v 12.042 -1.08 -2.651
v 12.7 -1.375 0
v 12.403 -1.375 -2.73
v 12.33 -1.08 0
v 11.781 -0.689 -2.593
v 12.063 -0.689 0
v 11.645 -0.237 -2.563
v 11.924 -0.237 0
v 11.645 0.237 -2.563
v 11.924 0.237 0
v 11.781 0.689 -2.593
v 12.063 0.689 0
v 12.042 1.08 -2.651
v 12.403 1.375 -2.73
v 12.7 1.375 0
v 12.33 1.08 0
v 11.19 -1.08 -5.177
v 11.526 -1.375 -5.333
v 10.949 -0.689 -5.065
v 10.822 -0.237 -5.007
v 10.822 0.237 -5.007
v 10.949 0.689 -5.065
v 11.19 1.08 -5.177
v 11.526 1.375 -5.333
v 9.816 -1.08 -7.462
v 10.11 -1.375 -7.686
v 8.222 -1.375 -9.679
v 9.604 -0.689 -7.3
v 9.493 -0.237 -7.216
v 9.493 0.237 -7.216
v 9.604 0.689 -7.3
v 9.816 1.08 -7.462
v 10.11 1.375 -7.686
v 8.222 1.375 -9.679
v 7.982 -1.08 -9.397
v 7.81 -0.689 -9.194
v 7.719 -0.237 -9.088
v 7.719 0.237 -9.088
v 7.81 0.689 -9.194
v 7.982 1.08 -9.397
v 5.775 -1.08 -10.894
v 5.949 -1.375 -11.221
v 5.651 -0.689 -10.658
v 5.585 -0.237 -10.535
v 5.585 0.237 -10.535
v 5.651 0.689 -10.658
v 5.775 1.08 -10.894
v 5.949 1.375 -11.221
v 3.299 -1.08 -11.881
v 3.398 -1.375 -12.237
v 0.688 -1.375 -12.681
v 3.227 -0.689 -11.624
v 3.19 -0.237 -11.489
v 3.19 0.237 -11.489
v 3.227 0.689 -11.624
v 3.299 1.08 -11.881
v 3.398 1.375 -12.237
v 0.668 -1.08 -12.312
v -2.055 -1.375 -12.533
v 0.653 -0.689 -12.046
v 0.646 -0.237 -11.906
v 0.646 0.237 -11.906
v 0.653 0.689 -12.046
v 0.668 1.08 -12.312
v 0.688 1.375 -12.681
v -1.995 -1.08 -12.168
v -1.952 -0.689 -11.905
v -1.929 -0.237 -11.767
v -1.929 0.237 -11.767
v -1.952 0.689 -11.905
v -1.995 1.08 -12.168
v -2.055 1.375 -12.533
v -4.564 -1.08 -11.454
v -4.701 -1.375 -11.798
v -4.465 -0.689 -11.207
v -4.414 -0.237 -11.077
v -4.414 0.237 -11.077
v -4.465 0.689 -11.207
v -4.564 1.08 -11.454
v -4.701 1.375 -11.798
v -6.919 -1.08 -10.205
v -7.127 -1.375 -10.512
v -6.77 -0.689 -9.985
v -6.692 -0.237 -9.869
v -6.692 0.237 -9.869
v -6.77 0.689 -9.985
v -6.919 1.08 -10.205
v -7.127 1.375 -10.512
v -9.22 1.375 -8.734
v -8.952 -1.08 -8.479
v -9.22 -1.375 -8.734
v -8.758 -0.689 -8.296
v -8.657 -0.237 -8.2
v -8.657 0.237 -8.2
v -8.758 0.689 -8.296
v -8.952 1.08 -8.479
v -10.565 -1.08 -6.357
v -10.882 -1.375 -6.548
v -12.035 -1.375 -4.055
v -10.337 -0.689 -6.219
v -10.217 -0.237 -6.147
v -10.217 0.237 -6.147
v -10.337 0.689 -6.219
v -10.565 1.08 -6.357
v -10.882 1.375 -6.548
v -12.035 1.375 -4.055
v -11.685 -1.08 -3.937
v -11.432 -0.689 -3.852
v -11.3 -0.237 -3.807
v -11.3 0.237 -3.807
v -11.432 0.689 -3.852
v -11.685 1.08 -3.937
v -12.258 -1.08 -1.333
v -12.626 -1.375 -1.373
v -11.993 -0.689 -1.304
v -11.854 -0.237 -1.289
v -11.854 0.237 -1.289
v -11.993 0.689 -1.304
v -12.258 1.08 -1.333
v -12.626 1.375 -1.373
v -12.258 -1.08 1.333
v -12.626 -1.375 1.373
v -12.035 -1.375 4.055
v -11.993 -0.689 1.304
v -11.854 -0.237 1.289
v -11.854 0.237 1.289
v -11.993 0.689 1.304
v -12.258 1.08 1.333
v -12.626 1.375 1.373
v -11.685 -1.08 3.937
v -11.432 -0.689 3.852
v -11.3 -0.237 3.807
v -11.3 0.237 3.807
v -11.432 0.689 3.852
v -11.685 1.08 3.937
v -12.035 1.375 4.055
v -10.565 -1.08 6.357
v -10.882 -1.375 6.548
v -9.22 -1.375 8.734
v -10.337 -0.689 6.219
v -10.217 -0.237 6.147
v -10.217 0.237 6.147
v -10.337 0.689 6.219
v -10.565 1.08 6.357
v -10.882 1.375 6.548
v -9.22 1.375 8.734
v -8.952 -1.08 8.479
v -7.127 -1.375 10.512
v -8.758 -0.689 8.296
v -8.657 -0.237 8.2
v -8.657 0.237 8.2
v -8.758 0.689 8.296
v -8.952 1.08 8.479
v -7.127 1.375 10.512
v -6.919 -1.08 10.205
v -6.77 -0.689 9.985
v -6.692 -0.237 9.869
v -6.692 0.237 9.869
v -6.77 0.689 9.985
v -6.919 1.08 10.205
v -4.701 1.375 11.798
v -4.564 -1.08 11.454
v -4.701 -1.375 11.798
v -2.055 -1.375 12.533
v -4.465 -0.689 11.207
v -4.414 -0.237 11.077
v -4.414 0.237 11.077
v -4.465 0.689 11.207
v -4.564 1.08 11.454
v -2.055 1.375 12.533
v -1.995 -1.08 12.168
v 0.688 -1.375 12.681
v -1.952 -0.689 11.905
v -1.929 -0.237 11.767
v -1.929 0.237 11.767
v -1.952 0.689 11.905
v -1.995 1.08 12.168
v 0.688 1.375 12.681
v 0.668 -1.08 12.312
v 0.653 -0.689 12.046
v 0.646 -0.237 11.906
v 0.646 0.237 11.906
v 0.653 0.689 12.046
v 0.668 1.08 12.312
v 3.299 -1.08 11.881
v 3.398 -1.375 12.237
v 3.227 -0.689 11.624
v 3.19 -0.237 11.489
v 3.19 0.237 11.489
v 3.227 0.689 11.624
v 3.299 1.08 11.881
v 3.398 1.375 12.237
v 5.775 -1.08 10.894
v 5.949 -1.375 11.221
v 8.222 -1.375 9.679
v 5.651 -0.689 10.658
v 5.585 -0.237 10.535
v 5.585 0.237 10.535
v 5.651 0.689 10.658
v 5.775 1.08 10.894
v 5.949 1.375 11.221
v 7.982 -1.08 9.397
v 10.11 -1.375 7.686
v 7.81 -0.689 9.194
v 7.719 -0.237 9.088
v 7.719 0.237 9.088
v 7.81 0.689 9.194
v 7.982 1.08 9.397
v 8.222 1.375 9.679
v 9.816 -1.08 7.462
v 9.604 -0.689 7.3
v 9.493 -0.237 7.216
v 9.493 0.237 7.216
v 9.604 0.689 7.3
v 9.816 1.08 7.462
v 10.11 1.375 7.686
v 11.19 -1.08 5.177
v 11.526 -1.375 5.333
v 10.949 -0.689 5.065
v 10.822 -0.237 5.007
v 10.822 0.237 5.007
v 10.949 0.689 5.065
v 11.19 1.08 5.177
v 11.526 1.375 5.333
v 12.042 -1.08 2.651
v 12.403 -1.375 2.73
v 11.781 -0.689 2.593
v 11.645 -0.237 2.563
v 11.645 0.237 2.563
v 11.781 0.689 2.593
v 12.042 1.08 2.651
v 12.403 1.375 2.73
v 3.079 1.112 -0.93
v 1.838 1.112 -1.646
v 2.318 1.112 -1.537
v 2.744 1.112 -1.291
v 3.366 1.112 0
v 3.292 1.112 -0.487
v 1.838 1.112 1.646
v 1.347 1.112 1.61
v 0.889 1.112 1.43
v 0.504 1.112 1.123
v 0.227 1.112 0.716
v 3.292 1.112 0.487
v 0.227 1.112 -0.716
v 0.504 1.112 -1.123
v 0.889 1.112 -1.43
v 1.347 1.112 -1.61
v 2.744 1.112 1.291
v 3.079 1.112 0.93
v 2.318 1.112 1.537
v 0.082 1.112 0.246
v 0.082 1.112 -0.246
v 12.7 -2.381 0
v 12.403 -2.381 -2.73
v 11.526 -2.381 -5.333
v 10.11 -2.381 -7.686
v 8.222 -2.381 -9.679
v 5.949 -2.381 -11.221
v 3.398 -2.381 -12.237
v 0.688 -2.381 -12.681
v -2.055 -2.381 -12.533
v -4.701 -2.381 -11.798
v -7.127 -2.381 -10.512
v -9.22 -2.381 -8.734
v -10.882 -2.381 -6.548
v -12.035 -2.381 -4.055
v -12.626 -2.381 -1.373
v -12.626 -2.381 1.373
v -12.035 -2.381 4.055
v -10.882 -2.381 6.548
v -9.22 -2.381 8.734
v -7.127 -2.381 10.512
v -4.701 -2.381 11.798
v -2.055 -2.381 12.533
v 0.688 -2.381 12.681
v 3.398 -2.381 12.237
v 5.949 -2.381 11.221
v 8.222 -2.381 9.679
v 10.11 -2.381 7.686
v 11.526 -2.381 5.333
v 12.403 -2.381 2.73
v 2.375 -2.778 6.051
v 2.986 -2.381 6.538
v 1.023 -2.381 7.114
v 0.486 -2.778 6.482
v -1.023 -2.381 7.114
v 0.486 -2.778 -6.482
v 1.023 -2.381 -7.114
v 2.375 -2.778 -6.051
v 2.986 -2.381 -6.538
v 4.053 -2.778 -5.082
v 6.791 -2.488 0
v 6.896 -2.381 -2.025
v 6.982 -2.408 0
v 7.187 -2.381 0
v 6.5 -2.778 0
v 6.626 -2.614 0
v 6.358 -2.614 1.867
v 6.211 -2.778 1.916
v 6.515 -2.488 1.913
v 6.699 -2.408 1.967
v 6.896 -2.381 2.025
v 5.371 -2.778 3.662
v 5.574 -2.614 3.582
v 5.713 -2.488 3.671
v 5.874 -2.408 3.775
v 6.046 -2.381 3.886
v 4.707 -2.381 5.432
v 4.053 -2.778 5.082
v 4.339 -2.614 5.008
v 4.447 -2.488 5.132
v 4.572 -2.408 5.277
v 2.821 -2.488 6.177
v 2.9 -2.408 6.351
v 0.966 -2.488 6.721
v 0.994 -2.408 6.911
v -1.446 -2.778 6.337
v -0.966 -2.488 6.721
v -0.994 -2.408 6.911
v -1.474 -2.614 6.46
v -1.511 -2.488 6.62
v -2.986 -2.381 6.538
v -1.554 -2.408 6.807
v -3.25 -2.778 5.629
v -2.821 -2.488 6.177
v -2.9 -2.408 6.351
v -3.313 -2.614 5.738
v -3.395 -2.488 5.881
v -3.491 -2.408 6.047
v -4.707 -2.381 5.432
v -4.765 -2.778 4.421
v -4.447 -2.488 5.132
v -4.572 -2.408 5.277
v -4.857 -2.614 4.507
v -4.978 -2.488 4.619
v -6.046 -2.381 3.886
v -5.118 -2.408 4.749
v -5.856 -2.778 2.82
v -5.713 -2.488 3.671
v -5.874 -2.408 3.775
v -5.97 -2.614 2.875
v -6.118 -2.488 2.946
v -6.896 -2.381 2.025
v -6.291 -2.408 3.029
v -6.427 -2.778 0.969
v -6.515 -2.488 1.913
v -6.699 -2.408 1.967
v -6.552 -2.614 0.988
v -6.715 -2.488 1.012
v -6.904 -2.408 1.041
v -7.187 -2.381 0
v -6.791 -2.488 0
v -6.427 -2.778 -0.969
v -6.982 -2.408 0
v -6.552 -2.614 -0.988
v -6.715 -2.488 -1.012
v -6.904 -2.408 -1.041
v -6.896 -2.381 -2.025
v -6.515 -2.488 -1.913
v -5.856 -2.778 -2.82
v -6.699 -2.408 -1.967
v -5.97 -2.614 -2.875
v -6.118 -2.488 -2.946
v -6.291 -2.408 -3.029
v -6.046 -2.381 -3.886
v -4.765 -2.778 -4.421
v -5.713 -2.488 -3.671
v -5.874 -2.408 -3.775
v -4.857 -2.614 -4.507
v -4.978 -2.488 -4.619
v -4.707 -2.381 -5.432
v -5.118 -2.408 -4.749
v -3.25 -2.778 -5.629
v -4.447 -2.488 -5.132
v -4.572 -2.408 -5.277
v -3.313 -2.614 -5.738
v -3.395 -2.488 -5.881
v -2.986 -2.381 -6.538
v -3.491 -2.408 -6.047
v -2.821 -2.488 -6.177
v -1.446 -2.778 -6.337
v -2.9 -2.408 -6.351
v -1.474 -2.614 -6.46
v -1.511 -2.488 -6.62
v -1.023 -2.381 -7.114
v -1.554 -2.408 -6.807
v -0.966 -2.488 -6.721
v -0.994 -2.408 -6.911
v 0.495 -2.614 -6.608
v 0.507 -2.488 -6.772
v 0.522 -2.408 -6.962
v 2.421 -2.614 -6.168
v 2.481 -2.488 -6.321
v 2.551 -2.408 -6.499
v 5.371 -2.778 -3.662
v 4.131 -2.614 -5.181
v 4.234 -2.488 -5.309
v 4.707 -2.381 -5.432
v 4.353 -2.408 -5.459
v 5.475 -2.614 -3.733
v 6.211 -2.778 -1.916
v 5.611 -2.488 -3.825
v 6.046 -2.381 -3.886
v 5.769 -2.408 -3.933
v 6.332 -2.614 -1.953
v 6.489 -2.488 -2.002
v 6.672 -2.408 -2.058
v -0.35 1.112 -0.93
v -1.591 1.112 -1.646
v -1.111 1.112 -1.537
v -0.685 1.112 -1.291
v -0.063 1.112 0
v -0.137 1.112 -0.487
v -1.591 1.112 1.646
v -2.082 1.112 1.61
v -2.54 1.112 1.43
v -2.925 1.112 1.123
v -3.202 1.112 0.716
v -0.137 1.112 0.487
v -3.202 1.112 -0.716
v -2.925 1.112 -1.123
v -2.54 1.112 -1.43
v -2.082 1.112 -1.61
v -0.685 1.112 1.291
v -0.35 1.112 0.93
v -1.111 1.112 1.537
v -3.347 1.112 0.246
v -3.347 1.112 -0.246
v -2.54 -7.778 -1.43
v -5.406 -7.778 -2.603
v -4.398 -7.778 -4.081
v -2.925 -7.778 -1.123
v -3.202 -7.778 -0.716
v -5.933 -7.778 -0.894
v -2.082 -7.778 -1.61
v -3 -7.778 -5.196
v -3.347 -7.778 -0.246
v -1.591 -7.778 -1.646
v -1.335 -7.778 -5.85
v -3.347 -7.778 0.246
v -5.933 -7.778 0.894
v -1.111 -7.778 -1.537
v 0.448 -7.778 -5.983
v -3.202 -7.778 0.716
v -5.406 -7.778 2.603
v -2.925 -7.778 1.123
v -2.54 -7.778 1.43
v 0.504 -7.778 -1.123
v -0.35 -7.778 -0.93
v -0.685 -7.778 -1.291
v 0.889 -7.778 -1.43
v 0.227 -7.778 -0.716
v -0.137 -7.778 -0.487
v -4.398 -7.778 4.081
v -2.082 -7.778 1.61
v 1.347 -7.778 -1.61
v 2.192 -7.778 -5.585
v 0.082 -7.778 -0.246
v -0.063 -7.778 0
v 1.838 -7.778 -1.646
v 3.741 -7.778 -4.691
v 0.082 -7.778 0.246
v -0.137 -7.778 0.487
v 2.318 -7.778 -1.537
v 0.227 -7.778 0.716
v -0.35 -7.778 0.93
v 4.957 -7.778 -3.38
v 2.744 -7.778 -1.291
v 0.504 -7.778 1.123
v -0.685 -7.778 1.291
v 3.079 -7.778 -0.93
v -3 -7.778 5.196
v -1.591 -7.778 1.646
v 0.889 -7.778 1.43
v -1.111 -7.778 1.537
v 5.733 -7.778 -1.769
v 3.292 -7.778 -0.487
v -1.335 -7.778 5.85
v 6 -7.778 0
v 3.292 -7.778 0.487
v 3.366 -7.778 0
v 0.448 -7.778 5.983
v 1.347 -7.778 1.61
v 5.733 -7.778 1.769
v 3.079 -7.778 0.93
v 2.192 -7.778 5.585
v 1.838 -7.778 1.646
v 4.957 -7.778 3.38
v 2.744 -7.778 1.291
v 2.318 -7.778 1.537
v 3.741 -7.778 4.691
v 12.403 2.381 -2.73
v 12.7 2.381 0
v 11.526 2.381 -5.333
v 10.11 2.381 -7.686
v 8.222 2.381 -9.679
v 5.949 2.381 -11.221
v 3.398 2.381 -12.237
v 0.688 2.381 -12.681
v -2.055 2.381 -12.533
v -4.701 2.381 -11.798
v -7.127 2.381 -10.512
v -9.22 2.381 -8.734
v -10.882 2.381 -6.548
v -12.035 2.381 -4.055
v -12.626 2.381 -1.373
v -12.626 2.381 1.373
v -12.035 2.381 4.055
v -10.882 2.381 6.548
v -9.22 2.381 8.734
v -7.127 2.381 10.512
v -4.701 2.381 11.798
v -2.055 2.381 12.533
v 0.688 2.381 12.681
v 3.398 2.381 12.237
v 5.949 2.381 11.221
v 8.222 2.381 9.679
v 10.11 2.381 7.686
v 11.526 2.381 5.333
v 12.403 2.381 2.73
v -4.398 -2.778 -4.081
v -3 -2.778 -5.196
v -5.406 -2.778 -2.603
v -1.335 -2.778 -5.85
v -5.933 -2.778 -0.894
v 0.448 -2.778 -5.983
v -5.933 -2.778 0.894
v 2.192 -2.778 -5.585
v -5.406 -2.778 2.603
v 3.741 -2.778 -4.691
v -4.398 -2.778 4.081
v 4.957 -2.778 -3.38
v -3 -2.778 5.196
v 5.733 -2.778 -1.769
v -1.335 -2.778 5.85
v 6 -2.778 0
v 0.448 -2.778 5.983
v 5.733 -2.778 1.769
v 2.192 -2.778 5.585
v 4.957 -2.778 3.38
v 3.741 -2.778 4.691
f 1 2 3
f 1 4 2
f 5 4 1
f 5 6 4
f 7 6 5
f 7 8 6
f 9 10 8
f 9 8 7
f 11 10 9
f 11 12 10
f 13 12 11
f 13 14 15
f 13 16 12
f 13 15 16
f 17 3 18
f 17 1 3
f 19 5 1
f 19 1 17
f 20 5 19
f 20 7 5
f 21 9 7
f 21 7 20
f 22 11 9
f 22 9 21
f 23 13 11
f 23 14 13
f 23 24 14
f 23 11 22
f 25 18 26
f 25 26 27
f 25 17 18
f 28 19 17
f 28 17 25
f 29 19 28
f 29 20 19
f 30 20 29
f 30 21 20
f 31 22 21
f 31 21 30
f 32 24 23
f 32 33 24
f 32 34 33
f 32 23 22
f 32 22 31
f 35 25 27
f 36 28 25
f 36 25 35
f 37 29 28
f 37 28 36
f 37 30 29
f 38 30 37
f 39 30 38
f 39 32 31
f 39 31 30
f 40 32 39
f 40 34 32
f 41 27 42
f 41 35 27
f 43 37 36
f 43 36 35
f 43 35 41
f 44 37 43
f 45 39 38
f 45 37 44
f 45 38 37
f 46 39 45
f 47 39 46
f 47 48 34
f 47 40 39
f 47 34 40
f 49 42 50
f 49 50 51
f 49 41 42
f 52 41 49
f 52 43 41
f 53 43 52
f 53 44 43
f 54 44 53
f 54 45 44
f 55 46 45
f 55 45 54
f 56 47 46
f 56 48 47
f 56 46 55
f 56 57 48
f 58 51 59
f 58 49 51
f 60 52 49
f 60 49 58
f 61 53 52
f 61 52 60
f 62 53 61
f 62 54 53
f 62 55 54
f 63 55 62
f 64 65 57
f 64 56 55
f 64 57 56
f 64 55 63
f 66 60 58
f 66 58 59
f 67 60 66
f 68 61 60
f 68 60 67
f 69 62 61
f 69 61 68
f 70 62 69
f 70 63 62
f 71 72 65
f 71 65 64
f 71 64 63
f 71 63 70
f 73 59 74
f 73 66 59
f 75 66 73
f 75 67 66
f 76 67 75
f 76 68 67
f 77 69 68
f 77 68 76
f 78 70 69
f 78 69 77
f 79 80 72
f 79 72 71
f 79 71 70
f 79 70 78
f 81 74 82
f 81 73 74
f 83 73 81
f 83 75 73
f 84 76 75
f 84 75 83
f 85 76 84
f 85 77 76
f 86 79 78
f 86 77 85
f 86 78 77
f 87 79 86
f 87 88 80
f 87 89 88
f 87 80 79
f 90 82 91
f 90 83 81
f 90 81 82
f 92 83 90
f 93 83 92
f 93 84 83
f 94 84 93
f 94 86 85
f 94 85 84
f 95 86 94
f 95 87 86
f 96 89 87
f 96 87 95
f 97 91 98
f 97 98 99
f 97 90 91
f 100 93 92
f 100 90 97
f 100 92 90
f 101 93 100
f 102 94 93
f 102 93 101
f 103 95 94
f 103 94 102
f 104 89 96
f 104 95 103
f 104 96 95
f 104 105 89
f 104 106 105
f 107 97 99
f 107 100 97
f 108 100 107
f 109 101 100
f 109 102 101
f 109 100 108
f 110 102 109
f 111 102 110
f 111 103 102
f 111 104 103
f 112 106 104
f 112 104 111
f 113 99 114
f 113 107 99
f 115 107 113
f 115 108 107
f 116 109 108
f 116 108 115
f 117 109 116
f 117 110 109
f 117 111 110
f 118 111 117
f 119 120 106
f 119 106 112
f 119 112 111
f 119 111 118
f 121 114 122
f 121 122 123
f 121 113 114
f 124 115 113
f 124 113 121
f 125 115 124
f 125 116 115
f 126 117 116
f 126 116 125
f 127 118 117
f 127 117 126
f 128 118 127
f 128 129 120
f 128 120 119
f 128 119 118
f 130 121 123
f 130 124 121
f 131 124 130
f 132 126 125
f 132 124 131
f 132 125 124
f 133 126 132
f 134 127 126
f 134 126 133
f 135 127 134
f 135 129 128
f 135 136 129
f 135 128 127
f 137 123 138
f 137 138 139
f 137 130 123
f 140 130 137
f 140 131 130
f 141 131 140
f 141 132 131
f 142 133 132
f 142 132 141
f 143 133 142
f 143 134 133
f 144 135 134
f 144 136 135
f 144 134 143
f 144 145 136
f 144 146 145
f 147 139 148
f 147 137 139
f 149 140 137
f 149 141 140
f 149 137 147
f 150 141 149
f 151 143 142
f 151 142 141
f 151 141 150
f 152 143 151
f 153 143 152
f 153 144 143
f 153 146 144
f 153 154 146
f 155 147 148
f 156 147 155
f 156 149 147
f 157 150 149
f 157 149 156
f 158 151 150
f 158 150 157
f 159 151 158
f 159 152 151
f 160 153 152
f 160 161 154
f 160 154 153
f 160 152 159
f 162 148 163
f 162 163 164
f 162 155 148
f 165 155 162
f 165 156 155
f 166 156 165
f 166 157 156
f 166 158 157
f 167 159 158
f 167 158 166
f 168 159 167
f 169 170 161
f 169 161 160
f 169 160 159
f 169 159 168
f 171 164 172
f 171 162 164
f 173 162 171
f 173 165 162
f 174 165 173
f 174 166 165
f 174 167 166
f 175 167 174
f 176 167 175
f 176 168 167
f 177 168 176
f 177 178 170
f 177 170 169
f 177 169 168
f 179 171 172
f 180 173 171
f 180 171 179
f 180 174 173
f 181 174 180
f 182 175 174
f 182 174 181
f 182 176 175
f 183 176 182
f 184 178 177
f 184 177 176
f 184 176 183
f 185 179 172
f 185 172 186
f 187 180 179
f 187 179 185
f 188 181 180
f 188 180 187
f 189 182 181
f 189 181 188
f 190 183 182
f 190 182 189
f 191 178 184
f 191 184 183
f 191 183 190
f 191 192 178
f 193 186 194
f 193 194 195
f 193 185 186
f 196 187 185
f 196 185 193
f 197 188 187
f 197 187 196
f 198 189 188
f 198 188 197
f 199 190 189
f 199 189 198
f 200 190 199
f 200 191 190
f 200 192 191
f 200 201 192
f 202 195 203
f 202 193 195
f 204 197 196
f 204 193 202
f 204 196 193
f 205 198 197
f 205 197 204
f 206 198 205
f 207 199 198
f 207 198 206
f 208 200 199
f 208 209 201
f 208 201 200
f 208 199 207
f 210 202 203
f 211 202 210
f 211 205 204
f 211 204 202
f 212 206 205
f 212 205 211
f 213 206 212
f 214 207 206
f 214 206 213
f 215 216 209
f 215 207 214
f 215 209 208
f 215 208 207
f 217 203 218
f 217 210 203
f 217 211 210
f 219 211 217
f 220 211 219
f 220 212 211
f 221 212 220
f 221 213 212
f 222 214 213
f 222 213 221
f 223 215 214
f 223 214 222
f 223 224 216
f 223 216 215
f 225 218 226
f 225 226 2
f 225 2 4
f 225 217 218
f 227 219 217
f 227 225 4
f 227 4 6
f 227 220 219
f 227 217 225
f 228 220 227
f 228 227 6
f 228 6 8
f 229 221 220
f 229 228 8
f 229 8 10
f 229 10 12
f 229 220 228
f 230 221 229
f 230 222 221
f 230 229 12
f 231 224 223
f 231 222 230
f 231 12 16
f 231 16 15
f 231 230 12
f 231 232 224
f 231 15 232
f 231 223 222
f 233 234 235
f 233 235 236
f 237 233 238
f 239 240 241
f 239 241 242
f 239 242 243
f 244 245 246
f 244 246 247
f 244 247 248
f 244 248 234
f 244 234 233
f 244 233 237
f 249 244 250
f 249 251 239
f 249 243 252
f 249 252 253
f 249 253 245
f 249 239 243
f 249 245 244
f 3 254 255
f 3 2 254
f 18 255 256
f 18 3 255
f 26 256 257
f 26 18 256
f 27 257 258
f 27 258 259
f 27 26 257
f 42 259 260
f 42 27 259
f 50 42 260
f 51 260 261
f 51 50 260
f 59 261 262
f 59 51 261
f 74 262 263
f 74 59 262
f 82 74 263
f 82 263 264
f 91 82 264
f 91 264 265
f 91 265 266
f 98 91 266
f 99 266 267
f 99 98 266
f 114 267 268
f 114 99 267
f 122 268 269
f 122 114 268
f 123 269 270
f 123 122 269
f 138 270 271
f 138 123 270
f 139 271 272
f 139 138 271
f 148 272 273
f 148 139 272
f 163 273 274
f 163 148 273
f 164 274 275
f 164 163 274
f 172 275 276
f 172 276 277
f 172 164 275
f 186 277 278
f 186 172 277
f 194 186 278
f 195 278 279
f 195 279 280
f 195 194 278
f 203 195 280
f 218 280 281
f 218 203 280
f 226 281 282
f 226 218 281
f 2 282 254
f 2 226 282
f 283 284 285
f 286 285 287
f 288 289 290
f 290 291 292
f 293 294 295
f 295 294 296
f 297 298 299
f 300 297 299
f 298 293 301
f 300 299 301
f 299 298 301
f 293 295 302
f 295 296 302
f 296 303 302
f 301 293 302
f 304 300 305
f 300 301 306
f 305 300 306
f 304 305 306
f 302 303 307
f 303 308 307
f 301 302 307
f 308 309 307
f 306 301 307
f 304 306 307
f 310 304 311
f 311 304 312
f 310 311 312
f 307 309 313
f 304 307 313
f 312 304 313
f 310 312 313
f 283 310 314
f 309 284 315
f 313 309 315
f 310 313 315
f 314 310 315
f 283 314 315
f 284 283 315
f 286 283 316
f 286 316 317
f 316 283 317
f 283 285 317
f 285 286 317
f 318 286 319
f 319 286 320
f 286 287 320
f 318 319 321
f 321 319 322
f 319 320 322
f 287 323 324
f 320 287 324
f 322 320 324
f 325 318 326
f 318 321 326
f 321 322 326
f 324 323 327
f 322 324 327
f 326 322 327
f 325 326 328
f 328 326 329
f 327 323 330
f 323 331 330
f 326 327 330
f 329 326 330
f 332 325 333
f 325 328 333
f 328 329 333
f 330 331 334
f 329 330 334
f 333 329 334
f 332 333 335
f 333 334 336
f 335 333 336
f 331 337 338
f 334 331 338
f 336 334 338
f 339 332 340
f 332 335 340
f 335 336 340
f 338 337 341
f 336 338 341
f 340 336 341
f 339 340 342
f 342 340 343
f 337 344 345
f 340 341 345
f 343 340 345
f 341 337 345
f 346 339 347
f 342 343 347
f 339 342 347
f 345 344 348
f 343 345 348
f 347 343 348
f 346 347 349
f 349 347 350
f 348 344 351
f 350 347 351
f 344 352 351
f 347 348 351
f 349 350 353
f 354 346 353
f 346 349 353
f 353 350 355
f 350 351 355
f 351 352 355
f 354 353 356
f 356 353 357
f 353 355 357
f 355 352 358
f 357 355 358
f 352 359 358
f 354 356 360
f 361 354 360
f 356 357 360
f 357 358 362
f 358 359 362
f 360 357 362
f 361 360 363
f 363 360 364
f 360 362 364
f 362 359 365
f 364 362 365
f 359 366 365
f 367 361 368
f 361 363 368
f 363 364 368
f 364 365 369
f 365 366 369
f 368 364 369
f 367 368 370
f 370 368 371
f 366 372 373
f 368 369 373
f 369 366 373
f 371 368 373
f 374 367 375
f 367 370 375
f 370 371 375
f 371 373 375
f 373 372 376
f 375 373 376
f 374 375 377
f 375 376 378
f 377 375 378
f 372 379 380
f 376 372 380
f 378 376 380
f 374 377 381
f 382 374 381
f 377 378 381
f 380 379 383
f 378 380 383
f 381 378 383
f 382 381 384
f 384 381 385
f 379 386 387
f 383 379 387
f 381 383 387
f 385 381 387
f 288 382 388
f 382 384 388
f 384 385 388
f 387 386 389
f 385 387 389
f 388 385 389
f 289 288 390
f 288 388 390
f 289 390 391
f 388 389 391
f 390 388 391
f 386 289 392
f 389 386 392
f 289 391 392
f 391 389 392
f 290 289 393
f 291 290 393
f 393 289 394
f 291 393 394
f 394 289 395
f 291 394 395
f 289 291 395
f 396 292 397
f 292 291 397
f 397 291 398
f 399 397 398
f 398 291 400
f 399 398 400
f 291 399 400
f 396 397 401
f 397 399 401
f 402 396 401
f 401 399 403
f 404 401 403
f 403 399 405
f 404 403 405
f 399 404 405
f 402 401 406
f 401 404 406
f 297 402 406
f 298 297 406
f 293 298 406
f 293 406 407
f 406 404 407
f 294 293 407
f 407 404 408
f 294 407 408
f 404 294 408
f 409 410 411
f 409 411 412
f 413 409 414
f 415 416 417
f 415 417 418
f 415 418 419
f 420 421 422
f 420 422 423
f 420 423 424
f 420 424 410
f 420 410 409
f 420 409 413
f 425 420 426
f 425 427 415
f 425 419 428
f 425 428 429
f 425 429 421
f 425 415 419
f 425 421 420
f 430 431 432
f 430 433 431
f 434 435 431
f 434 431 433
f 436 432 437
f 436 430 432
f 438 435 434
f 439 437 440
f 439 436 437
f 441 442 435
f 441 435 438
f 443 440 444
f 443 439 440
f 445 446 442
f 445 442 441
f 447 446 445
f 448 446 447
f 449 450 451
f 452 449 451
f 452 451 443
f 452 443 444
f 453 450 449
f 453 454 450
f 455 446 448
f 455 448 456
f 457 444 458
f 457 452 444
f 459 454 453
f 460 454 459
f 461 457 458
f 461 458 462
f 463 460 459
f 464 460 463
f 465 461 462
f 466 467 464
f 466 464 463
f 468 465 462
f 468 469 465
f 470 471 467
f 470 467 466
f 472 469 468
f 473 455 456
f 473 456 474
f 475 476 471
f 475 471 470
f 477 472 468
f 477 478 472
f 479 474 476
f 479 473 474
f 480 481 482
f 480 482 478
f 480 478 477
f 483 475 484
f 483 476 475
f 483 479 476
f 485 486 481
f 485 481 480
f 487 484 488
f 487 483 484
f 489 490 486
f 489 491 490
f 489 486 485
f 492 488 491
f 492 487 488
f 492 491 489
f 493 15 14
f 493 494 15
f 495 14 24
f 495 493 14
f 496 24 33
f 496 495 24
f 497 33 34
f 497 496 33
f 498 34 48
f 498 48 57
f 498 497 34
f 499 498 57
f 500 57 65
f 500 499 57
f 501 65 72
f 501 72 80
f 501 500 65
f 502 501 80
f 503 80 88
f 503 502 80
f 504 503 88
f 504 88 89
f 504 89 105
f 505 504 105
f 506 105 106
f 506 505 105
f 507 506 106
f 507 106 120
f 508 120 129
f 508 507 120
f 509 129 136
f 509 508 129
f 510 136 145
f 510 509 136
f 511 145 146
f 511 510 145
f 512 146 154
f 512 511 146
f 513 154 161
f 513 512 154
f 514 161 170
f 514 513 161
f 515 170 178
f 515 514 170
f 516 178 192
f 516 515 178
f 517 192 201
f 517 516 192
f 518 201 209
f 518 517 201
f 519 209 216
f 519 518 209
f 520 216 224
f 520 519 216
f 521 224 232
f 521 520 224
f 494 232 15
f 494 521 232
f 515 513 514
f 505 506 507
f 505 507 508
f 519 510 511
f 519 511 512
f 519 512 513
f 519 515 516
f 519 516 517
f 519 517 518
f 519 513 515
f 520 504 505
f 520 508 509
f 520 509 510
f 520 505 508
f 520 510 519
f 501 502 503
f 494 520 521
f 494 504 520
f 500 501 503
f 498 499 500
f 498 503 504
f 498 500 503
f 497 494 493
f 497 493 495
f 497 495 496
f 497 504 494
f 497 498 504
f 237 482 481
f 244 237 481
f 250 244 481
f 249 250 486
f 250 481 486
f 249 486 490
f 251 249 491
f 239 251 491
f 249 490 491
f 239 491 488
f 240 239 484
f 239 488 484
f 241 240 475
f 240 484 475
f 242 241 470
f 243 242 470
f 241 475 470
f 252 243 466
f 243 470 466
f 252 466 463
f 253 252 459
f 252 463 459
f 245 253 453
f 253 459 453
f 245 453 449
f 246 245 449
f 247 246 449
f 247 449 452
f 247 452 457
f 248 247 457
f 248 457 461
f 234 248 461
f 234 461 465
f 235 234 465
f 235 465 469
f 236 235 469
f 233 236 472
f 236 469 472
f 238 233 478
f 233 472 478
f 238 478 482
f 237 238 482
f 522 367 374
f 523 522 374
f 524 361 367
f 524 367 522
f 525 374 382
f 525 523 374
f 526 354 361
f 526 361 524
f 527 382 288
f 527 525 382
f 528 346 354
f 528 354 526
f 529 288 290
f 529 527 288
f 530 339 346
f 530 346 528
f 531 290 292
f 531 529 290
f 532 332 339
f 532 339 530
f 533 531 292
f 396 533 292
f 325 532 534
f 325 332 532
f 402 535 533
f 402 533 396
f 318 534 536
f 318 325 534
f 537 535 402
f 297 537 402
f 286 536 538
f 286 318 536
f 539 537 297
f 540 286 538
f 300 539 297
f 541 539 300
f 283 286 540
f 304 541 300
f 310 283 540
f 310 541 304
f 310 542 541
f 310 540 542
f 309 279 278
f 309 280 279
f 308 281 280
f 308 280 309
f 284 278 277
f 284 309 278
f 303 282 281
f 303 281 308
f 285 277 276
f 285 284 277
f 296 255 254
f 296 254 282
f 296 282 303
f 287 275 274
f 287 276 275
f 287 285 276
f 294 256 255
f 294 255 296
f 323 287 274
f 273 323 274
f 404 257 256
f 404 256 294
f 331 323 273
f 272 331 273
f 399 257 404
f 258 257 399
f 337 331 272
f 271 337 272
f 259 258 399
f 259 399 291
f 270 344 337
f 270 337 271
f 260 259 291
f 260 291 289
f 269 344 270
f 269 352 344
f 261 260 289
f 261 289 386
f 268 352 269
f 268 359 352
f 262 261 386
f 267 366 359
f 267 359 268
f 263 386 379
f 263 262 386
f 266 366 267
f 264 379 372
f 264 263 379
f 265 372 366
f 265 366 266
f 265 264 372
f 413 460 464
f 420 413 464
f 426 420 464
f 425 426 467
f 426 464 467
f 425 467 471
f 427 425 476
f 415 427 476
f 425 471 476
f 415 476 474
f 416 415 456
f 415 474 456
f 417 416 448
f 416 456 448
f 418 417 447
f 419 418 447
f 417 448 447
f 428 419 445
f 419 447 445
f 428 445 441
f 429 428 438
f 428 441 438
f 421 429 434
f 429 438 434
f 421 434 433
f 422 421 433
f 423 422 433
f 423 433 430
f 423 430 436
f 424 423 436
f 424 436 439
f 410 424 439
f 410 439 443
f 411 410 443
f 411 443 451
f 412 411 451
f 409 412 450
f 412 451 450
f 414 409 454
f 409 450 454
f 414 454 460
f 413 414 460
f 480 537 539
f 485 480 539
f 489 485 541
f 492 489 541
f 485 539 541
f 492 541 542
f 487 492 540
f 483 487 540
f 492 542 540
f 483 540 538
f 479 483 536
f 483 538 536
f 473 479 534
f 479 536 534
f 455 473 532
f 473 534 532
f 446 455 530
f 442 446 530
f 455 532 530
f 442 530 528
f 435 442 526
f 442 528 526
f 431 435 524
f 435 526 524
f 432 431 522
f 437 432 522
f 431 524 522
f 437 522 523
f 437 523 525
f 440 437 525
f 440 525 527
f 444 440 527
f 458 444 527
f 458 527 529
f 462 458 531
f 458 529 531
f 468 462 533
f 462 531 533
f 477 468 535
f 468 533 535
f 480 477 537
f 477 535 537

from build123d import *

# Parameters (mm, degrees)
SKETCH7_R           = 6.5
BOSS_EXTRUDE2_DEPTH = 0.396875
FILLET1_R           = 0.79375
SKETCH6_R           = 6
BOSS_EXTRUDE1_DEPTH = 5
SKETCH5_R           = 1.651
CUT_EXTRUDE3_DEPTH  = 8.89


with BuildPart() as part:
    # Sketch2 → Revolve1 (revolve)
    with BuildSketch(Plane.XY):
        with BuildLine():
            Line((0, 0), (0, -2.38125))
            Line((0, -2.38125), (12.7, -2.38125))
            Line((12.7, -2.38125), (12.7, -1.374815329))
            ThreePointArc((12.7, -1.374815329), (11.90625, 0), (12.7, 1.374815329))
            Line((12.7, 1.374815329), (12.7, 2.38125))
            Line((12.7, 2.38125), (0, 2.38125))
            Line((0, 2.38125), (0, 0))
        make_face()
    revolve(axis=Axis((0, 0, 0), (0, 1, 0)))

    # Sketch7 → Boss-Extrude2 (add)
    with BuildSketch(Plane(origin=(0, -2.38125, 0), x_dir=(-1, 0, 0), z_dir=(0, -1, 0))):
        with Locations(Location((0, 0, 0), (0, 0, 180))):
            Circle(SKETCH7_R)
    extrude(amount=BOSS_EXTRUDE2_DEPTH)

    # Fillet1
    # the kernel refuses this fillet: 0.79375 mm, written as the material it adds along each edge
    with BuildSketch(Plane(origin=(0, -2.38125, 0), x_dir=(1, 0, 0), z_dir=(0, 0, -1))) as fillet1_piece_1:
        with BuildLine():
            CenterArc((7.187407664, 0.79375), FILLET1_R, 210, 60)
            Line((6.5, 0.396875), (6.486251847, 0.3889375))
            ThreePointArc((6.486251847, 0.3889375), (6.484125, 0.1984375), (6.484125, 0))
            Line((6.484125, 0), (6.5, -0.015875))
            Line((6.5, -0.015875), (7.187407664, -0.015875))
            Line((7.187407664, -0.015875), (7.187407664, 0))
        make_face()
    revolve(axis=Axis((0, -2.38125, 0), (0, -1, 0)))

    # Sketch6 → Boss-Extrude1 (add)
    with BuildSketch(Plane.XZ.offset(2.778125)):
        Circle(SKETCH6_R)
    extrude(amount=BOSS_EXTRUDE1_DEPTH)

    # Sketch5 → Cut-Extrude3 (cut)
    with BuildSketch(Plane.XZ.offset(7.778125)):
        with Locations((-1.7145, 0)):
            Circle(SKETCH5_R)
        with Locations((1.7145, 0)):
            Circle(SKETCH5_R)
    extrude(amount=-CUT_EXTRUDE3_DEPTH, mode=Mode.SUBTRACT)


solid = part.part
